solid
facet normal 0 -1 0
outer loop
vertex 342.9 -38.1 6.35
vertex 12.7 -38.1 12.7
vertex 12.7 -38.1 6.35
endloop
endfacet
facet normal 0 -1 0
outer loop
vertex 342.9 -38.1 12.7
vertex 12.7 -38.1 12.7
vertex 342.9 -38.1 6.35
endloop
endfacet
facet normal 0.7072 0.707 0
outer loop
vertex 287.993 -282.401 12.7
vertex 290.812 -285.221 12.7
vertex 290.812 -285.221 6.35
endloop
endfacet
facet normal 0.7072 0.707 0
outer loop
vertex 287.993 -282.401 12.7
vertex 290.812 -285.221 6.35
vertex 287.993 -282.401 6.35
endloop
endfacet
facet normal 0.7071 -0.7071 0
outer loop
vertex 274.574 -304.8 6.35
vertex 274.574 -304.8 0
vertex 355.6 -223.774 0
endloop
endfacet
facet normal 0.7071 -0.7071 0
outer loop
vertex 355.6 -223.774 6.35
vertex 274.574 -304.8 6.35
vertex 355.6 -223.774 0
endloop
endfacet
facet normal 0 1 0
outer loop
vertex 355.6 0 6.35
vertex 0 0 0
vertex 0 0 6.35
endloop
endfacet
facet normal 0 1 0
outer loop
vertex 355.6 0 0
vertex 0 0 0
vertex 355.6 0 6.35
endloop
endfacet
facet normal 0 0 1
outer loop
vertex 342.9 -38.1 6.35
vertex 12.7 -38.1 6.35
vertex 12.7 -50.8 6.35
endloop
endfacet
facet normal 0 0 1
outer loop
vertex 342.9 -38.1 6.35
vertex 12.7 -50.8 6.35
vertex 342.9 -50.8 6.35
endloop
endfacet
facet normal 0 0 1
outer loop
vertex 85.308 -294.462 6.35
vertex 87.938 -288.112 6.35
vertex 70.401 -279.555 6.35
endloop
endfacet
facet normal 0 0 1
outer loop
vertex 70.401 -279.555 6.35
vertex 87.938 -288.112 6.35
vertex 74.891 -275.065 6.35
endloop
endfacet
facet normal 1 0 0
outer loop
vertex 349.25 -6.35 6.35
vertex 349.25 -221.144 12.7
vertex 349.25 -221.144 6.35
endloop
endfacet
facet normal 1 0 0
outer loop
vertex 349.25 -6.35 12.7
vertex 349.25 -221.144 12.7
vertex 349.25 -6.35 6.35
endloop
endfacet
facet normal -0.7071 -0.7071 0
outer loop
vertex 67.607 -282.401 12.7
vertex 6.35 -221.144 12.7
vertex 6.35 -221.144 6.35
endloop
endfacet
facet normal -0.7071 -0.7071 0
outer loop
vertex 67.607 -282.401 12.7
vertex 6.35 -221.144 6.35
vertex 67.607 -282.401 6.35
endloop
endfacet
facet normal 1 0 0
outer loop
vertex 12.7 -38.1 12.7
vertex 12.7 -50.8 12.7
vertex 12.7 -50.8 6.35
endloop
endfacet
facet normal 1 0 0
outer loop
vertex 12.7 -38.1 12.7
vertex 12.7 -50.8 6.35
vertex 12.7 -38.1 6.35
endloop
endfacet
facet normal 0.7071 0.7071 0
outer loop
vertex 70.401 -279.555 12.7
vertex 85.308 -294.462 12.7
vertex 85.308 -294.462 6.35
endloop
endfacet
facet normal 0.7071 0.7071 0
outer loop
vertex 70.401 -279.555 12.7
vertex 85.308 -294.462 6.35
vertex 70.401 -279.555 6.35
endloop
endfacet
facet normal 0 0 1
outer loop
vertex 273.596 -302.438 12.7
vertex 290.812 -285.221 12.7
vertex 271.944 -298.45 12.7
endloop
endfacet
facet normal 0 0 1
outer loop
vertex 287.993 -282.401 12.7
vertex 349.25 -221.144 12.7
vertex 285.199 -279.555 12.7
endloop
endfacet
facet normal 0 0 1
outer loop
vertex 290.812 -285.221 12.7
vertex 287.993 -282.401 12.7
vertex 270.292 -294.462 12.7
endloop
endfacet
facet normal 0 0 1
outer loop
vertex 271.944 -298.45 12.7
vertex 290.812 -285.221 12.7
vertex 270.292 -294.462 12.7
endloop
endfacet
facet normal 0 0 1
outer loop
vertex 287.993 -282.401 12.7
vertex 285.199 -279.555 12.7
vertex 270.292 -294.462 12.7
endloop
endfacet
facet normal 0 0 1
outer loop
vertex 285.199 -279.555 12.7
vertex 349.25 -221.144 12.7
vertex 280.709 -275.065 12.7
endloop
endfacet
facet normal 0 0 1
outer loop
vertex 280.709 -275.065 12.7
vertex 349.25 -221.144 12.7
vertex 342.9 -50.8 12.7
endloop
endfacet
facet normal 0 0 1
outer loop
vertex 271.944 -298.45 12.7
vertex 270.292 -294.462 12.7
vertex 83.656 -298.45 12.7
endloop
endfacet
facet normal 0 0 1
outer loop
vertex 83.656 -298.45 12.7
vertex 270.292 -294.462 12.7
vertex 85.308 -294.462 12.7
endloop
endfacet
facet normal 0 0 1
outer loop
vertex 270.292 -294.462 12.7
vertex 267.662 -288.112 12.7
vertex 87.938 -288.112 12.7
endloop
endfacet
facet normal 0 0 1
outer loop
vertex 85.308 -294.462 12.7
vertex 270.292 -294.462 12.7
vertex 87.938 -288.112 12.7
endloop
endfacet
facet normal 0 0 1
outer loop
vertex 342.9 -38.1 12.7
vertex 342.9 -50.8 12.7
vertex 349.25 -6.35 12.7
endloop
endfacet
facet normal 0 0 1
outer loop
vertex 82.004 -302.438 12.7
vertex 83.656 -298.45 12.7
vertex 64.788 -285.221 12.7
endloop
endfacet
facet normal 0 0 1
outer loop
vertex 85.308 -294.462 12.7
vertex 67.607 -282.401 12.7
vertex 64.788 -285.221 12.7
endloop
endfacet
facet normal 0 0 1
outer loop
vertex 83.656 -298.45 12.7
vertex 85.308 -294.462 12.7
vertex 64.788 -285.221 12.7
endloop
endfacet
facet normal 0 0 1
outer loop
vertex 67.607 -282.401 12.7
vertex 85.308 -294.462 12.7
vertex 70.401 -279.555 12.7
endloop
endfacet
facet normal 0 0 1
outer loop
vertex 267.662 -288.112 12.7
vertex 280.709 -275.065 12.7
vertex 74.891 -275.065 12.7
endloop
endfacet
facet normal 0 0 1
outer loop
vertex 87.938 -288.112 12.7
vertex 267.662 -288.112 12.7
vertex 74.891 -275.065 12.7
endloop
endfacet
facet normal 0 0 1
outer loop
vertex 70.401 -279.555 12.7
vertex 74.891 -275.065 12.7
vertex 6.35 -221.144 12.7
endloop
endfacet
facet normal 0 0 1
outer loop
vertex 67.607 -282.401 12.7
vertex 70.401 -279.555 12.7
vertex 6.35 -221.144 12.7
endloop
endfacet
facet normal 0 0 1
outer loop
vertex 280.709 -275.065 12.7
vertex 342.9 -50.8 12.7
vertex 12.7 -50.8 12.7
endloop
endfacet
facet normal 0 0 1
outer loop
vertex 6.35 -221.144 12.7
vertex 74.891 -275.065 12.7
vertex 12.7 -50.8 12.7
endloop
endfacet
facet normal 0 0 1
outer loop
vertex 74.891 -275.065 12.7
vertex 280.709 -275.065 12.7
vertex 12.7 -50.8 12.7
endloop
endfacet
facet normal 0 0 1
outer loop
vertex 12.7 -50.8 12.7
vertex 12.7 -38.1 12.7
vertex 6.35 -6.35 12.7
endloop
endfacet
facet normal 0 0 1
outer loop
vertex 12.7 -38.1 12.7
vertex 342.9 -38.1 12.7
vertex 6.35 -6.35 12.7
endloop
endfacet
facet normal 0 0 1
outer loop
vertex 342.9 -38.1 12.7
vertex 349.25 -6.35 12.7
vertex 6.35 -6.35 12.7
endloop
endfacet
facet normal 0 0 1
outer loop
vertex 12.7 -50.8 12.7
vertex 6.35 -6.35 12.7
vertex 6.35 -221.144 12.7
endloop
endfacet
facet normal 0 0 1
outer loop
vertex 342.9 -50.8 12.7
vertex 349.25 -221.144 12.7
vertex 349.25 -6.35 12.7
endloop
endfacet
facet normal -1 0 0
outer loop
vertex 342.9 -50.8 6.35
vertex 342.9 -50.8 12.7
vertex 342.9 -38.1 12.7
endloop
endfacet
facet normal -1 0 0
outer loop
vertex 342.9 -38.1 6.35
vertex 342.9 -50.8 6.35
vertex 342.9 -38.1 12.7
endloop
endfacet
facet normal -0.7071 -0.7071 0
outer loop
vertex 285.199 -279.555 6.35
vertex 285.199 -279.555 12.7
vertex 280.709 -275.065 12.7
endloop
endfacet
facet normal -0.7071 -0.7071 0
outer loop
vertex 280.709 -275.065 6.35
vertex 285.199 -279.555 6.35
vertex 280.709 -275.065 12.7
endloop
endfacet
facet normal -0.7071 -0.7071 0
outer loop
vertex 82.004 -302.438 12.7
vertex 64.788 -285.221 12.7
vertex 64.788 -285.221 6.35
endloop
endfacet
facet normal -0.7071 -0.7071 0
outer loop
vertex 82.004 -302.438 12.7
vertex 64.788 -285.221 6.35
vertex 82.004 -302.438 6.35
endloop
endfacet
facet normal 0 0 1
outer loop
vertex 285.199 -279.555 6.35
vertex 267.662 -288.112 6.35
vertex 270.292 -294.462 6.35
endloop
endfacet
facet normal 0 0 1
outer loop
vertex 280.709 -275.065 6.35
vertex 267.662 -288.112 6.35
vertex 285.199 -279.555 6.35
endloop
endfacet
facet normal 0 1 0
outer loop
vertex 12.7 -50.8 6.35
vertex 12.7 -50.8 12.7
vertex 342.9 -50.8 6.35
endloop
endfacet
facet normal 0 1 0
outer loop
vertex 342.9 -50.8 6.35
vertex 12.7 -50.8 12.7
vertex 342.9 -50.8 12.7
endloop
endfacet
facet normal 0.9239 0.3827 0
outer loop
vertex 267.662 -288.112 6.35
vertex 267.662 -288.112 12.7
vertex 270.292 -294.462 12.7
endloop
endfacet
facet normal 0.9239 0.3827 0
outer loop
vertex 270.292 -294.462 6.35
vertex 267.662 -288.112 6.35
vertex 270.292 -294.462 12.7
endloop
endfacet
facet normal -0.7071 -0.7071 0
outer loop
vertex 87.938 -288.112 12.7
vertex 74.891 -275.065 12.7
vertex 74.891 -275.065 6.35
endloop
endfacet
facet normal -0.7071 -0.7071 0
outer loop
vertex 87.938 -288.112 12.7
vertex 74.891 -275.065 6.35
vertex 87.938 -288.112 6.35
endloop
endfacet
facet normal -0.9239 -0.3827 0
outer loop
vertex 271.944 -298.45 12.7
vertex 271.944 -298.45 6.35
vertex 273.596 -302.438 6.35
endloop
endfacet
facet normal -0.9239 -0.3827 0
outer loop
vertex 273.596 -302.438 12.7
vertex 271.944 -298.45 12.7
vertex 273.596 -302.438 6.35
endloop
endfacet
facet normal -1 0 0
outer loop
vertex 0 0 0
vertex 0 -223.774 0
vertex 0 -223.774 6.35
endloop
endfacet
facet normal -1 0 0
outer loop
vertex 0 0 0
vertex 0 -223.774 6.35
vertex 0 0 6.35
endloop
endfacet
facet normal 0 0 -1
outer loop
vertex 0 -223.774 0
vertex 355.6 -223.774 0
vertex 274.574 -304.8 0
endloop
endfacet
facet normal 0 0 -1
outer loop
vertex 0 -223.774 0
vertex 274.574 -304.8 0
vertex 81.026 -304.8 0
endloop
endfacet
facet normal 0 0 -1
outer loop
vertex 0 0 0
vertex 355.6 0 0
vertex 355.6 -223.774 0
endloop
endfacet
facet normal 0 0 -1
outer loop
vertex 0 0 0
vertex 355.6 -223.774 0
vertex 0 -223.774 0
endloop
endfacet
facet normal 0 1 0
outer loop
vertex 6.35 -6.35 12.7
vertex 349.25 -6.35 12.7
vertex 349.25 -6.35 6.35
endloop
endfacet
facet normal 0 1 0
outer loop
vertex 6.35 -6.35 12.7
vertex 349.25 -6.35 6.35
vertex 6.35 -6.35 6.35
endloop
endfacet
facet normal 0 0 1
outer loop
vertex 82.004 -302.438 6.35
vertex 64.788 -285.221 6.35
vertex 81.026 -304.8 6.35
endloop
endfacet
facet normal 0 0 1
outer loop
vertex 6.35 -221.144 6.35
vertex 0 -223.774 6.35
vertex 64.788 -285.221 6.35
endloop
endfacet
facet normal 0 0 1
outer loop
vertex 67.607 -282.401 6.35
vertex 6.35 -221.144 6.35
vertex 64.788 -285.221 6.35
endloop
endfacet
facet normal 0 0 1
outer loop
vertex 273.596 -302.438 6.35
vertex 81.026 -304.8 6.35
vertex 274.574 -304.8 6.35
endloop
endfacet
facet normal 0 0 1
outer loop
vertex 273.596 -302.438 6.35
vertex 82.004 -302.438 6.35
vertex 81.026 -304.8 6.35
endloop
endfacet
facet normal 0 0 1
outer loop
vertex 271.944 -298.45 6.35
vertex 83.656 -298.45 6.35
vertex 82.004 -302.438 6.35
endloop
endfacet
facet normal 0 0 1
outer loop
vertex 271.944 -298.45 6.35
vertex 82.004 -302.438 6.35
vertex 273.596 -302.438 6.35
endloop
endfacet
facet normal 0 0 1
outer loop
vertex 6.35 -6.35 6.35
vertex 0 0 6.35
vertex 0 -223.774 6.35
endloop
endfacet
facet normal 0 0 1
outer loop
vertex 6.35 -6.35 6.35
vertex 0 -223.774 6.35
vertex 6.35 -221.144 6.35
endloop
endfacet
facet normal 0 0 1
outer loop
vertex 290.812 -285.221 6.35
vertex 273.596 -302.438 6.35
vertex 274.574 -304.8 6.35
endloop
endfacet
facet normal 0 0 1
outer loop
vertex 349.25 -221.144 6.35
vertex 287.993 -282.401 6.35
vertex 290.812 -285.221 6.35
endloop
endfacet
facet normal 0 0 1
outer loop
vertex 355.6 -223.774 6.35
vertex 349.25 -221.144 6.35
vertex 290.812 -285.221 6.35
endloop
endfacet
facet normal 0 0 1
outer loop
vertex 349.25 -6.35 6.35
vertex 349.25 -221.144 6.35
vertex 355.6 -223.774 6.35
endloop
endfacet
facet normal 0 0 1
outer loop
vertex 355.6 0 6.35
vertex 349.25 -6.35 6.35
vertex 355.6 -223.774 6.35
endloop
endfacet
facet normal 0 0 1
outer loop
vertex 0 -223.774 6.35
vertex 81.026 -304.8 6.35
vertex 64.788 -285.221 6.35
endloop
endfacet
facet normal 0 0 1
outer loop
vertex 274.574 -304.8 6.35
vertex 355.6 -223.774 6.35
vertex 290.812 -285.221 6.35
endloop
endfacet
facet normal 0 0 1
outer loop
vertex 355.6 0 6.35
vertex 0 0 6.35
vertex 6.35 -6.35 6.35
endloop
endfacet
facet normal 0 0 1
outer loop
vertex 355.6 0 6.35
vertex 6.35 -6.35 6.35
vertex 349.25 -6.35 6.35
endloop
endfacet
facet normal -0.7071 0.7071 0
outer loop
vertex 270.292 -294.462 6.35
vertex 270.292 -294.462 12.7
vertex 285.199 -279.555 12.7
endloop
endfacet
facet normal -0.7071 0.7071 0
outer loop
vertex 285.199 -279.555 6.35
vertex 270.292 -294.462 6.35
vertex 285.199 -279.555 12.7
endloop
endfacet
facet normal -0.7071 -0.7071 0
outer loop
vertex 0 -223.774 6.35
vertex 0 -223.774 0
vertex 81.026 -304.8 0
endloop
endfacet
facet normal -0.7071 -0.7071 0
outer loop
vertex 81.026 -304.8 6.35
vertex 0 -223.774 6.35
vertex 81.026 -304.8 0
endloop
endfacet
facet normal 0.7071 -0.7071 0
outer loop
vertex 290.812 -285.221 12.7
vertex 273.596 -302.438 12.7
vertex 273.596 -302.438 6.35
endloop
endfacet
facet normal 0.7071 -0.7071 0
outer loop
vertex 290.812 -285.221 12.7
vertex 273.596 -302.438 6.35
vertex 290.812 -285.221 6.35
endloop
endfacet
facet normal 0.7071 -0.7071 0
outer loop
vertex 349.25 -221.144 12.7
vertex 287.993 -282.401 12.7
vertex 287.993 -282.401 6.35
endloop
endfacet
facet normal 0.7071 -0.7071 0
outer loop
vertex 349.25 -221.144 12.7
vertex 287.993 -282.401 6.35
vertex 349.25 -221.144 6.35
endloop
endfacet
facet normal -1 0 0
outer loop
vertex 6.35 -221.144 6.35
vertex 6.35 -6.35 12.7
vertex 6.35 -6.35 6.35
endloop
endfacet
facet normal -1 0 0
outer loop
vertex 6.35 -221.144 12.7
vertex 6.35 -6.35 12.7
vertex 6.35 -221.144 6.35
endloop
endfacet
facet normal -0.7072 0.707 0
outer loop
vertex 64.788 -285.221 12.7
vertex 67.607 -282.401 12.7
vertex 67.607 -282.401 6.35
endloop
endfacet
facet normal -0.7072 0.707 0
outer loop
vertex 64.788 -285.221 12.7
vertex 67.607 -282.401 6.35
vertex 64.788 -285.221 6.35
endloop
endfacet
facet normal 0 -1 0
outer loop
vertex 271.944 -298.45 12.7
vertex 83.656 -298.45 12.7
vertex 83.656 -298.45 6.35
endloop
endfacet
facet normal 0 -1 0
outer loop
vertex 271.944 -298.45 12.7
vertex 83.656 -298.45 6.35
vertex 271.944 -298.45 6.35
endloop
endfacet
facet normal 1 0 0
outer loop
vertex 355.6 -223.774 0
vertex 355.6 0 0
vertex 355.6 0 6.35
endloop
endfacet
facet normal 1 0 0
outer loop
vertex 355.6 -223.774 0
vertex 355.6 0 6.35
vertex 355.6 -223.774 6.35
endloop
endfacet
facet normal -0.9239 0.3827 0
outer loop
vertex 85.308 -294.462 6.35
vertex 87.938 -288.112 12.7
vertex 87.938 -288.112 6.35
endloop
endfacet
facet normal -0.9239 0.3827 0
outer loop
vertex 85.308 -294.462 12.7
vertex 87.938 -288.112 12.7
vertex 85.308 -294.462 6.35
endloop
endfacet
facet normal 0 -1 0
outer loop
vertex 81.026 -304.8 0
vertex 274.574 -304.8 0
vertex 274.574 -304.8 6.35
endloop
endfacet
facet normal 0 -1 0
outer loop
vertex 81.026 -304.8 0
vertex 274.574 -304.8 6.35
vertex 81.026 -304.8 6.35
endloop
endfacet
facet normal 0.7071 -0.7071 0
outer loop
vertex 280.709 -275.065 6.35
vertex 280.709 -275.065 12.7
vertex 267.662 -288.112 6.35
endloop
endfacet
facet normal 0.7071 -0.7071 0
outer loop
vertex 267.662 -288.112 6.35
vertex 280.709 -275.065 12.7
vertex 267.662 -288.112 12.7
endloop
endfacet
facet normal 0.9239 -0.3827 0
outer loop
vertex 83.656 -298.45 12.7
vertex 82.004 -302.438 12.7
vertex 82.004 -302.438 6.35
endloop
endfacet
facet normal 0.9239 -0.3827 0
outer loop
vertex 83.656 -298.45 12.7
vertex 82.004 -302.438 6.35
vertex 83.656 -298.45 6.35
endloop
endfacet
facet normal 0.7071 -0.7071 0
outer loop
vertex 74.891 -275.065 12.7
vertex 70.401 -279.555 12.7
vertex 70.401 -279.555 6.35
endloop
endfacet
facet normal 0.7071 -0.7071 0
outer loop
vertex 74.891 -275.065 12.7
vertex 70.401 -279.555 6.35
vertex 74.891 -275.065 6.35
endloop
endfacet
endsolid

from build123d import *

# Parameters (mm, degrees)
BOSS_EXTRUDE1_DEPTH = 12.7
SKETCH2_W           = 330.2
SKETCH2_H           = 12.7
CUT_EXTRUDE1_DEPTH  = 6.35
CUT_EXTRUDE3_DEPTH  = 6.35


with BuildPart() as part:
    # Sketch1 → Boss-Extrude1 (new body)
    with BuildSketch(Plane.XY):
        Polygon((0, 0), (355.6, 0), (355.6, -223.774), (292.534512242, -286.839487758), (274.574, -304.8), (81.026, -304.8), (63.065487758, -286.839487758), (0, -223.774), align=None)
    extrude(amount=BOSS_EXTRUDE1_DEPTH)

    # Sketch2 → Cut-Extrude1 (cut)
    with BuildSketch(Plane.XY.offset(12.7)):
        Polygon((0, 0), (0, -223.774), (81.026, -304.8), (274.574, -304.8), (355.6, -223.774), (355.6, 0), align=None)
        Polygon((6.35, -221.143743879), (67.607470696, -282.401214575), (64.787670274, -285.221014997), (82.004455277, -302.4378), (83.656256121, -298.45), (271.943743879, -298.45), (273.595544723, -302.4378), (290.812329726, -285.221014997), (287.992529304, -282.401214575), (349.25, -221.143743879), (349.25, -6.35), (6.35, -6.35), align=None, mode=Mode.SUBTRACT)
        with Locations((177.8, -44.45)):
            Rectangle(SKETCH2_W, SKETCH2_H)
    extrude(amount=-CUT_EXTRUDE1_DEPTH, mode=Mode.SUBTRACT)

    # Sketch3 → Cut-Extrude3 (cut)
    with BuildSketch(Plane.XY.offset(12.7)):
        Polygon((85.308056965, -294.4622), (70.400831804, -279.554974839), (74.890959865, -275.064846778), (87.938313086, -288.1122), align=None)
        Polygon((285.199168196, -279.554974839), (280.709040135, -275.064846778), (267.661686914, -288.1122), (270.291943035, -294.4622), align=None)
    extrude(amount=-CUT_EXTRUDE3_DEPTH, mode=Mode.SUBTRACT)


solid = part.part
